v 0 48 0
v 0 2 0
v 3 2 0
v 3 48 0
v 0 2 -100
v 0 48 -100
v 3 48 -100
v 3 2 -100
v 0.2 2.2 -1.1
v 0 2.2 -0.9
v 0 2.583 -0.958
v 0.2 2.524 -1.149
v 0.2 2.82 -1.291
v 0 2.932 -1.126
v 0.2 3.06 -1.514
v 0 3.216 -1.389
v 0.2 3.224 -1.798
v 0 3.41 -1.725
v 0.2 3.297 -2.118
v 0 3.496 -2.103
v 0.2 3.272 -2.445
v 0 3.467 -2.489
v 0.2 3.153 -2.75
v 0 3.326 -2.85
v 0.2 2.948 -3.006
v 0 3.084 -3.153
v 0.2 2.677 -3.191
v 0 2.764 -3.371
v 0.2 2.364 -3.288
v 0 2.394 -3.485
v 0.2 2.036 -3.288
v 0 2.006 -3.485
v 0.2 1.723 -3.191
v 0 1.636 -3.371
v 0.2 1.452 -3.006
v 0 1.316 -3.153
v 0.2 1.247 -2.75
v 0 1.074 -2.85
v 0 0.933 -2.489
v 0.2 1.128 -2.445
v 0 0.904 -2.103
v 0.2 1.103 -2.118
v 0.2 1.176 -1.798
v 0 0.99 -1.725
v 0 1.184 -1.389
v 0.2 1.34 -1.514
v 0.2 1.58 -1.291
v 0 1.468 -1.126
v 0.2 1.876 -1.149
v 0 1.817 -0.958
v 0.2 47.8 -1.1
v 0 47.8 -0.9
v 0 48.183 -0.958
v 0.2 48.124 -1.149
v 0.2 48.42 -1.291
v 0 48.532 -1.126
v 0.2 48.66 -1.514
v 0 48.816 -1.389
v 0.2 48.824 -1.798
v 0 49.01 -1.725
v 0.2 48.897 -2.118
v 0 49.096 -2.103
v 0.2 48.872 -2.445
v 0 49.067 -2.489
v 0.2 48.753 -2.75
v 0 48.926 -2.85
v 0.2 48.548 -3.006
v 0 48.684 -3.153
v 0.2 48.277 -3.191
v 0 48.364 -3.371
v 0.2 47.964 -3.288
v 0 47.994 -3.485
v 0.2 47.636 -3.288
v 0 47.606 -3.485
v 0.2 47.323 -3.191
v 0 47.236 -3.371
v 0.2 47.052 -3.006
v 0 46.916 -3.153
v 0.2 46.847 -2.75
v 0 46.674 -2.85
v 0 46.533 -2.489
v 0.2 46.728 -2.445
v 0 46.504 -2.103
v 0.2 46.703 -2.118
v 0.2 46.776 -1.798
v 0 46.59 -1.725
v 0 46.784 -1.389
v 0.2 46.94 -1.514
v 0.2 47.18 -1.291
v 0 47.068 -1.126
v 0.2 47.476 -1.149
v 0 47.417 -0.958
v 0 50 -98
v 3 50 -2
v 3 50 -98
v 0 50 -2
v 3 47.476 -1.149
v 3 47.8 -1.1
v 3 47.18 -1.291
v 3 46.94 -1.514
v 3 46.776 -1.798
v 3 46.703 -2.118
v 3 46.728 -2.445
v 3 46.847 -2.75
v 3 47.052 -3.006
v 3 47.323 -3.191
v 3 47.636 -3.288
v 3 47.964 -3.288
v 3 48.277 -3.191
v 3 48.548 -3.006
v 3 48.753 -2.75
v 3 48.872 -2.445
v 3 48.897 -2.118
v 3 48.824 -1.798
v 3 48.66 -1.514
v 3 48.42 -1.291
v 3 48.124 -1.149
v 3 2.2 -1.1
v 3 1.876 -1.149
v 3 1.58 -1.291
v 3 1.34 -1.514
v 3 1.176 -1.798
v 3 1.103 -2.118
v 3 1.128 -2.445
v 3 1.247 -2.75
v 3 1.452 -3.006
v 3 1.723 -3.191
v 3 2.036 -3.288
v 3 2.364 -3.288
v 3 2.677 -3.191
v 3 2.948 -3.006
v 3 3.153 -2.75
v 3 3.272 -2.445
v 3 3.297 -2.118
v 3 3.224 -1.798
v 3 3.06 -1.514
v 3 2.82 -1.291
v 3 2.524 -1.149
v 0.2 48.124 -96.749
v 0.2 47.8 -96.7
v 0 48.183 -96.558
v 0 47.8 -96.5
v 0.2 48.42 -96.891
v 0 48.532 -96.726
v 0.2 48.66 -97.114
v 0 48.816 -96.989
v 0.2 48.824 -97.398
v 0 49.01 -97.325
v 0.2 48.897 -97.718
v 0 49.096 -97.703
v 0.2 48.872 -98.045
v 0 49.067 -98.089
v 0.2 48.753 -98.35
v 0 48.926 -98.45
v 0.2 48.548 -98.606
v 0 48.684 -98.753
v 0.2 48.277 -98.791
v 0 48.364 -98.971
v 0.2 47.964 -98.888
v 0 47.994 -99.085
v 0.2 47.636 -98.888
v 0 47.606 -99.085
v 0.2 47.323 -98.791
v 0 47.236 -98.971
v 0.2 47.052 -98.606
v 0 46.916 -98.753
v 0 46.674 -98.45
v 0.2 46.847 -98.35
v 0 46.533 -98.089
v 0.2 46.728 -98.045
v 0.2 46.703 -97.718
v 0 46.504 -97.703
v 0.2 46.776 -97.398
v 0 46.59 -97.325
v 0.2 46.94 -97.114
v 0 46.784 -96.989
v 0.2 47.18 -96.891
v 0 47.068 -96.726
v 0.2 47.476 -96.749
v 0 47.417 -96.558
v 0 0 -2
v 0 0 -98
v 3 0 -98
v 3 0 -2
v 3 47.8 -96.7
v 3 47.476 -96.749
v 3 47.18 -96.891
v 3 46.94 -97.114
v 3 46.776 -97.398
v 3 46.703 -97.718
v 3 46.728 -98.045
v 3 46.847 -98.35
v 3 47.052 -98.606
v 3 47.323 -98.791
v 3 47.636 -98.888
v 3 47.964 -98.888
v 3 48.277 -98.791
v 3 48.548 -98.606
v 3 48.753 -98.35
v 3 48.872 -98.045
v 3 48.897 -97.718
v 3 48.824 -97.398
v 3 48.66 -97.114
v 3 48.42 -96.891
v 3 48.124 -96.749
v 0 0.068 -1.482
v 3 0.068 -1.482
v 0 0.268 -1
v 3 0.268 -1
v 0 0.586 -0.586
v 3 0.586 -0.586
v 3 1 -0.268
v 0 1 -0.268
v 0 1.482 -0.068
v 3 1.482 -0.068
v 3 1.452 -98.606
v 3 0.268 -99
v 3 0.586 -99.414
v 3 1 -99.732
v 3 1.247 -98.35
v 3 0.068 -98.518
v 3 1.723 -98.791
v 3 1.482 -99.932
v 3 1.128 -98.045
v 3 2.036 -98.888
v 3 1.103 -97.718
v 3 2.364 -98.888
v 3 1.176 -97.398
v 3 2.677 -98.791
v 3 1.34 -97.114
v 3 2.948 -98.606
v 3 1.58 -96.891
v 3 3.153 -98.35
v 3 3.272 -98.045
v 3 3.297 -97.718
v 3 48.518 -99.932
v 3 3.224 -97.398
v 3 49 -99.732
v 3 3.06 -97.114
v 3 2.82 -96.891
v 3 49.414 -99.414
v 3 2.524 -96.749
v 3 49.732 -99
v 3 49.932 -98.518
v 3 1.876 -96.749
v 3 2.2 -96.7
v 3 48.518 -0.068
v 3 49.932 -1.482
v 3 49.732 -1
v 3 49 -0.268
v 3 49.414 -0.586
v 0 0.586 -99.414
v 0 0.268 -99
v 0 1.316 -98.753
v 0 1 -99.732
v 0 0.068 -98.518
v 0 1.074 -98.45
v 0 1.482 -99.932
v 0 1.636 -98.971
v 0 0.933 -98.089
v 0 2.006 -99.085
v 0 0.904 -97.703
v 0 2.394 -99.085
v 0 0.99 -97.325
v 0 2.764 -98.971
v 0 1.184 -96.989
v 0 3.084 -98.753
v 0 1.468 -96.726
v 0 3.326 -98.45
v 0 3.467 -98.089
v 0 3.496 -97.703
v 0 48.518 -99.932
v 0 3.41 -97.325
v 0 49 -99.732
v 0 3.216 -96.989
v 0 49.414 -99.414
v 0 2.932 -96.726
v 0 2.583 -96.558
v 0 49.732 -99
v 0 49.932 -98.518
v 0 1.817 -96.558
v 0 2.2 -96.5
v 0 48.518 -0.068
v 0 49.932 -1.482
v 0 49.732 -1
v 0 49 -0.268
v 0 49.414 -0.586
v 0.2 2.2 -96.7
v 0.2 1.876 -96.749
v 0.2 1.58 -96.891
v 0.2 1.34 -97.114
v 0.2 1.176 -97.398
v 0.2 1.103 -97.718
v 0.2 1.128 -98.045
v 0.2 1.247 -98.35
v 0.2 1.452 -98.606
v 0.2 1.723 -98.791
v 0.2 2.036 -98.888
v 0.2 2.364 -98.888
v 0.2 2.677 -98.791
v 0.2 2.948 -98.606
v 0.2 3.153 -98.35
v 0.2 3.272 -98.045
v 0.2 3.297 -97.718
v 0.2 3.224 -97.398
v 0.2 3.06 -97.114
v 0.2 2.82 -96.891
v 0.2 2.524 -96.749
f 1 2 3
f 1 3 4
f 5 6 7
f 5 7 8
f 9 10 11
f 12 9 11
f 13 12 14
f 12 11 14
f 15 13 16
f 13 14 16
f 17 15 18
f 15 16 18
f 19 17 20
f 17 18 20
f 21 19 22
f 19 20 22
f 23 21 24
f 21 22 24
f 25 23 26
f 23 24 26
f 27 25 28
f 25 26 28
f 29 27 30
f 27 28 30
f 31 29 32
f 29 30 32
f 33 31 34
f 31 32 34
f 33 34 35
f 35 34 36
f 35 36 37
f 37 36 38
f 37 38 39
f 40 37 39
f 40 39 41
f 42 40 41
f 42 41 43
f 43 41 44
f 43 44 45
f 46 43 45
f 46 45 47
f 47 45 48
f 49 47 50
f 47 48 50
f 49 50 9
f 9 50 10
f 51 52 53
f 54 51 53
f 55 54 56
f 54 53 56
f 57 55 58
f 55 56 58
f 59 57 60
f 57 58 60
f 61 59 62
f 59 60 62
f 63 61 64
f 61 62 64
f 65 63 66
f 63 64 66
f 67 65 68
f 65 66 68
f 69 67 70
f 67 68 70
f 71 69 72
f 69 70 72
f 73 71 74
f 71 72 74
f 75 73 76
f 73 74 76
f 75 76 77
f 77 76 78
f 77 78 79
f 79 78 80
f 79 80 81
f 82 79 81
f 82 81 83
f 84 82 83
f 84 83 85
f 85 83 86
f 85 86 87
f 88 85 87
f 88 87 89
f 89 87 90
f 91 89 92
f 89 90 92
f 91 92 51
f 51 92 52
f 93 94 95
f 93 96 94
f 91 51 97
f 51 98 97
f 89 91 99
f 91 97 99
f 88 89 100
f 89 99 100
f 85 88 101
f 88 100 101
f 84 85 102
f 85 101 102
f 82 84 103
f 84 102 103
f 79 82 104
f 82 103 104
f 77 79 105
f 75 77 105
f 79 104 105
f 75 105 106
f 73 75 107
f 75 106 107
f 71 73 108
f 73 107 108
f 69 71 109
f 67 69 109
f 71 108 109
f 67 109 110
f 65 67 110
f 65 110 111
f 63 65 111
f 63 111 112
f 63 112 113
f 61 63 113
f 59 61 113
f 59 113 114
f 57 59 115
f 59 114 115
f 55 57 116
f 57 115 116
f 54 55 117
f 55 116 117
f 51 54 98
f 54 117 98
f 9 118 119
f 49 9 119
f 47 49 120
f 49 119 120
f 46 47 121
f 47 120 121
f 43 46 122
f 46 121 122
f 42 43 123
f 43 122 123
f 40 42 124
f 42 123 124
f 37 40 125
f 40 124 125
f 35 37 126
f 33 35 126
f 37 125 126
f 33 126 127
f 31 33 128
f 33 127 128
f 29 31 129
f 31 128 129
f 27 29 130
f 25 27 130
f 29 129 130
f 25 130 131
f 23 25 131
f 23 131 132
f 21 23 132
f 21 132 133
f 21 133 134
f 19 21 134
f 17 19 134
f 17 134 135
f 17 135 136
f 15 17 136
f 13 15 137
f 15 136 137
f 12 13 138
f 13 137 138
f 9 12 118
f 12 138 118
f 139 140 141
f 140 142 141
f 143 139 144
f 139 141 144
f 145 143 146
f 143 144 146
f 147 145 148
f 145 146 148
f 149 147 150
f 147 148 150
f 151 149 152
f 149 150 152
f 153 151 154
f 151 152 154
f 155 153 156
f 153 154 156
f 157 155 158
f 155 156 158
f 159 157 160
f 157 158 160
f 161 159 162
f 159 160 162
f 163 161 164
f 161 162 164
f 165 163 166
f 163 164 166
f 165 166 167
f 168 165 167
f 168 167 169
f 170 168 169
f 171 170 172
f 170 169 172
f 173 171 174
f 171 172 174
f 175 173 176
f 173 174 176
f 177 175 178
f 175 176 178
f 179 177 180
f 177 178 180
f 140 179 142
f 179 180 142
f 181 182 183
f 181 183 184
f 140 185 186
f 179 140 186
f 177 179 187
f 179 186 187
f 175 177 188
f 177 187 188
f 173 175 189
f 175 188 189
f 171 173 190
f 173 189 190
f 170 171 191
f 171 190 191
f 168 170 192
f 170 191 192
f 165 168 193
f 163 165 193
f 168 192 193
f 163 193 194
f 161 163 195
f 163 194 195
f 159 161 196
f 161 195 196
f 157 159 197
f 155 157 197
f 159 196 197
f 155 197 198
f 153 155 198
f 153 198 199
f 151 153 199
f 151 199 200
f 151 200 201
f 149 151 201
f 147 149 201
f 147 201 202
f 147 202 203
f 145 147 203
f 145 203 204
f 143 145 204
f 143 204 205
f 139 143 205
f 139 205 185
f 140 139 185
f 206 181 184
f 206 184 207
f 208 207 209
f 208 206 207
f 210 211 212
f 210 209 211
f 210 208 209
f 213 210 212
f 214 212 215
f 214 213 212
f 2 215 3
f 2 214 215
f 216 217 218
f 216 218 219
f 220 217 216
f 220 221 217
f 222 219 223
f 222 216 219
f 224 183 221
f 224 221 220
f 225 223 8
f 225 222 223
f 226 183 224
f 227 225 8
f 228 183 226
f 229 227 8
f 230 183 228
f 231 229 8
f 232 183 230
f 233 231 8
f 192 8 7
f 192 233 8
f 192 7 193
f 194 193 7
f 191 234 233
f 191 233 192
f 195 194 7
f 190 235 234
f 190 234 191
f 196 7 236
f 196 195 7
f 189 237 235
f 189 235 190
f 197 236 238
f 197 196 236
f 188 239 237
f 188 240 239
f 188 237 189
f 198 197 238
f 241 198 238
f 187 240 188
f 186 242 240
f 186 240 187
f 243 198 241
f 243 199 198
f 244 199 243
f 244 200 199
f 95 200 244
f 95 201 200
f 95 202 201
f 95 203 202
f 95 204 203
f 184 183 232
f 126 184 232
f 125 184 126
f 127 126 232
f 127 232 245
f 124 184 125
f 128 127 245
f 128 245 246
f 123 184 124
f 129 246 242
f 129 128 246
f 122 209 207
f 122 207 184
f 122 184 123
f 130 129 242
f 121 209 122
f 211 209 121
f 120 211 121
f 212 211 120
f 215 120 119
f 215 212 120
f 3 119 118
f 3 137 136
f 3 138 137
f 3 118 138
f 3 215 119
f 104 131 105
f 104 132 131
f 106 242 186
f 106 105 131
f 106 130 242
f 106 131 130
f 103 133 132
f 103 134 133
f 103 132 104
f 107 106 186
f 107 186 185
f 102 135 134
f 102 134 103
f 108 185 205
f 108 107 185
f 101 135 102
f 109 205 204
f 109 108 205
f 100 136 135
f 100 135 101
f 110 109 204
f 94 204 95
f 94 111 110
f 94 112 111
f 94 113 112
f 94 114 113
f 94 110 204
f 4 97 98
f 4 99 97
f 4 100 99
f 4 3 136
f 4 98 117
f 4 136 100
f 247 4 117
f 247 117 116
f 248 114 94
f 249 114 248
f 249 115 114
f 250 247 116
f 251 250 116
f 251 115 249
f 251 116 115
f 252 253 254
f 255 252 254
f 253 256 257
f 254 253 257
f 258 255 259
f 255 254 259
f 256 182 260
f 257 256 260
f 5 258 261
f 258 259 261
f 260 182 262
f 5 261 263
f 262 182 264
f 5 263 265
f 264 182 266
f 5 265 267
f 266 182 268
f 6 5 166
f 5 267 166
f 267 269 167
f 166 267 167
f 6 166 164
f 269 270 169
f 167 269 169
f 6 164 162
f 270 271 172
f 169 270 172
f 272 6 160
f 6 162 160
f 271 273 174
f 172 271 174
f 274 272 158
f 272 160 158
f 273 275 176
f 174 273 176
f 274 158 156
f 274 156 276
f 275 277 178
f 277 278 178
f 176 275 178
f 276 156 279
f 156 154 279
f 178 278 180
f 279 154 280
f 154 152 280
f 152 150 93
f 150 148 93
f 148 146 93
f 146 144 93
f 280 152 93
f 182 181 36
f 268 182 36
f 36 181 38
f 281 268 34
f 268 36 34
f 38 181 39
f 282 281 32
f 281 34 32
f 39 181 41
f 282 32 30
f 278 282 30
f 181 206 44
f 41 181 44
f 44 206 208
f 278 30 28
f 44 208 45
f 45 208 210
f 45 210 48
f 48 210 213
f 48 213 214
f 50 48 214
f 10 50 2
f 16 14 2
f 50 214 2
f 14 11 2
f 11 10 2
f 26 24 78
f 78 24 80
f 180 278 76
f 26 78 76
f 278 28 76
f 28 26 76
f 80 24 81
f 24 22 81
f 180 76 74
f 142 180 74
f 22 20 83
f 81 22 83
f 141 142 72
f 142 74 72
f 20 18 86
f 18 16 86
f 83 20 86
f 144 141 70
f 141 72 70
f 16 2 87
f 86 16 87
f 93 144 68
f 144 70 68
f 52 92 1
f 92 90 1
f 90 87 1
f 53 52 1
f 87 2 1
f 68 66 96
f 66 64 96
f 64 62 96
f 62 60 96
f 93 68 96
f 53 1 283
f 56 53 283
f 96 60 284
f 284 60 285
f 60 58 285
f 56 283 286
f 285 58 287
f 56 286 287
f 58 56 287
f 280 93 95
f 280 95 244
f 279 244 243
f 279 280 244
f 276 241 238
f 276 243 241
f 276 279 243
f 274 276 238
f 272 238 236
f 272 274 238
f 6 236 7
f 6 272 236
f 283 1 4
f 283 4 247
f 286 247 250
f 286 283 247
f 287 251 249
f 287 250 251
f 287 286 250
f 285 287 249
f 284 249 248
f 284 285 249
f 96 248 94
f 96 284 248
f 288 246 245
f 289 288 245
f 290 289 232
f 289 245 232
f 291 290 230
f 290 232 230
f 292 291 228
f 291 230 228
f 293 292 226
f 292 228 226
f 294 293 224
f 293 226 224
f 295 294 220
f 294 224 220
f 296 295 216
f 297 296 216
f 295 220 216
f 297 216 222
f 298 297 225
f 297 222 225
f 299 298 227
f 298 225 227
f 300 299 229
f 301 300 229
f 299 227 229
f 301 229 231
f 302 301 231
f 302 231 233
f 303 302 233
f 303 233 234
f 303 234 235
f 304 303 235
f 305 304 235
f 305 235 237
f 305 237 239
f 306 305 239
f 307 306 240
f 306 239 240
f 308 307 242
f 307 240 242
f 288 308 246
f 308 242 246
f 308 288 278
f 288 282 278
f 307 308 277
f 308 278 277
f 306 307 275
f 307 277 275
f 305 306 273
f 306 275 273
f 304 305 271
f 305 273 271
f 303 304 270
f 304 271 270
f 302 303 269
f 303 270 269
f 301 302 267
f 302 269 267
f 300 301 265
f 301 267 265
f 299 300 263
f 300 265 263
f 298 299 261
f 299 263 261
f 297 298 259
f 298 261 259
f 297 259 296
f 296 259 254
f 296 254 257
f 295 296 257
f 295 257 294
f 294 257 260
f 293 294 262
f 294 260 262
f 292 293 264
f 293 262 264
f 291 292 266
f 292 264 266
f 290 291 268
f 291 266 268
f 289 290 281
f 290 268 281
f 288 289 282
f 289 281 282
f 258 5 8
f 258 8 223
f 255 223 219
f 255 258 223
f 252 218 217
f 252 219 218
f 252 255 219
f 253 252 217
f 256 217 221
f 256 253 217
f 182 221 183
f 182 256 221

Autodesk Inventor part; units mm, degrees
ref_plane "YZ Plane" through (0, 0, 0) normal (1, 0, 0) x (0, 1, 0)
ref_plane "XZ Plane" through (0, 0, 0) normal (0, 1, 0) x (-1, 0, 0)
ref_plane "XY Plane" through (0, 0, 0) normal (0, 0, 1) x (1, 0, 0)
sketch "Sketch1" plane through (0, 0, 0) normal (1, 0, 0) x (0, 1, 0)
  line L0 (2, 0) -> (48, 0)
  line L1 (50, -2) -> (50, -98)
  line L2 (48, -100) -> (2, -100)
  line L3 (0, -98) -> (0, -2)
  arc A0 (50, -2) -> (48, 0) centre (48, -2) ccw
  arc A1 (0, -98) -> (2, -100) centre (2, -98) ccw
  arc A2 (48, -100) -> (50, -98) centre (48, -98) ccw
  arc A3 (2, 0) -> (0, -2) centre (2, -2) ccw
  circle A4 centre (47.8, -2.2) radius 1.1
  line L4 (50, -50) -> (19.7358, -50) construction
  line L5 (25, 0) -> (25, -33.4431) construction
  circle A5 centre (47.8, -97.8) radius 1.1
  circle A6 centre (2.2, -2.2) radius 1.1
  circle A7 centre (2.2, -97.8) radius 1.1
  point P0 (0, 0)
  point P1 (50, -100)
  point P2 (50, 0)
  point P3 (0, -100)
  point P4 (2, -2)
  point P5 (2, -98)
  dimension "d0" = 50
  dimension "d1" = 100
  dimension "d2" = 2
  dimension "d3" = 2.2
  dimension "d4" = 2.2
  dimension "d5" = 2.2
extrude "Extrusion1" add sketch "Sketch1" along normal blind 3 contours L0 A0 L1 A2 L2 A1 L3 A3 | A4 | A5 | A6 | A7
hole "Hole1" at (0, 47.8, -2.2) at (0, 2.2, -2.2) at (0, 47.8, -97.8) at (0, 2.2, -97.8) direction (1, 0, 0) diameter 2.2 depth 6.3 tip angle 118 clearance for "Countersunk Flat Head Screw ISO 2009/7046" size "M2" standard "ISO"
chamfer "Chamfer1" distance 0.2 angle 45 4 edges at (0, 2.2, -98.9) (0, 47.8, -98.9) (0, 2.2, -3.3) (0, 47.8, -3.3)
properties part number "ściana tylna"
